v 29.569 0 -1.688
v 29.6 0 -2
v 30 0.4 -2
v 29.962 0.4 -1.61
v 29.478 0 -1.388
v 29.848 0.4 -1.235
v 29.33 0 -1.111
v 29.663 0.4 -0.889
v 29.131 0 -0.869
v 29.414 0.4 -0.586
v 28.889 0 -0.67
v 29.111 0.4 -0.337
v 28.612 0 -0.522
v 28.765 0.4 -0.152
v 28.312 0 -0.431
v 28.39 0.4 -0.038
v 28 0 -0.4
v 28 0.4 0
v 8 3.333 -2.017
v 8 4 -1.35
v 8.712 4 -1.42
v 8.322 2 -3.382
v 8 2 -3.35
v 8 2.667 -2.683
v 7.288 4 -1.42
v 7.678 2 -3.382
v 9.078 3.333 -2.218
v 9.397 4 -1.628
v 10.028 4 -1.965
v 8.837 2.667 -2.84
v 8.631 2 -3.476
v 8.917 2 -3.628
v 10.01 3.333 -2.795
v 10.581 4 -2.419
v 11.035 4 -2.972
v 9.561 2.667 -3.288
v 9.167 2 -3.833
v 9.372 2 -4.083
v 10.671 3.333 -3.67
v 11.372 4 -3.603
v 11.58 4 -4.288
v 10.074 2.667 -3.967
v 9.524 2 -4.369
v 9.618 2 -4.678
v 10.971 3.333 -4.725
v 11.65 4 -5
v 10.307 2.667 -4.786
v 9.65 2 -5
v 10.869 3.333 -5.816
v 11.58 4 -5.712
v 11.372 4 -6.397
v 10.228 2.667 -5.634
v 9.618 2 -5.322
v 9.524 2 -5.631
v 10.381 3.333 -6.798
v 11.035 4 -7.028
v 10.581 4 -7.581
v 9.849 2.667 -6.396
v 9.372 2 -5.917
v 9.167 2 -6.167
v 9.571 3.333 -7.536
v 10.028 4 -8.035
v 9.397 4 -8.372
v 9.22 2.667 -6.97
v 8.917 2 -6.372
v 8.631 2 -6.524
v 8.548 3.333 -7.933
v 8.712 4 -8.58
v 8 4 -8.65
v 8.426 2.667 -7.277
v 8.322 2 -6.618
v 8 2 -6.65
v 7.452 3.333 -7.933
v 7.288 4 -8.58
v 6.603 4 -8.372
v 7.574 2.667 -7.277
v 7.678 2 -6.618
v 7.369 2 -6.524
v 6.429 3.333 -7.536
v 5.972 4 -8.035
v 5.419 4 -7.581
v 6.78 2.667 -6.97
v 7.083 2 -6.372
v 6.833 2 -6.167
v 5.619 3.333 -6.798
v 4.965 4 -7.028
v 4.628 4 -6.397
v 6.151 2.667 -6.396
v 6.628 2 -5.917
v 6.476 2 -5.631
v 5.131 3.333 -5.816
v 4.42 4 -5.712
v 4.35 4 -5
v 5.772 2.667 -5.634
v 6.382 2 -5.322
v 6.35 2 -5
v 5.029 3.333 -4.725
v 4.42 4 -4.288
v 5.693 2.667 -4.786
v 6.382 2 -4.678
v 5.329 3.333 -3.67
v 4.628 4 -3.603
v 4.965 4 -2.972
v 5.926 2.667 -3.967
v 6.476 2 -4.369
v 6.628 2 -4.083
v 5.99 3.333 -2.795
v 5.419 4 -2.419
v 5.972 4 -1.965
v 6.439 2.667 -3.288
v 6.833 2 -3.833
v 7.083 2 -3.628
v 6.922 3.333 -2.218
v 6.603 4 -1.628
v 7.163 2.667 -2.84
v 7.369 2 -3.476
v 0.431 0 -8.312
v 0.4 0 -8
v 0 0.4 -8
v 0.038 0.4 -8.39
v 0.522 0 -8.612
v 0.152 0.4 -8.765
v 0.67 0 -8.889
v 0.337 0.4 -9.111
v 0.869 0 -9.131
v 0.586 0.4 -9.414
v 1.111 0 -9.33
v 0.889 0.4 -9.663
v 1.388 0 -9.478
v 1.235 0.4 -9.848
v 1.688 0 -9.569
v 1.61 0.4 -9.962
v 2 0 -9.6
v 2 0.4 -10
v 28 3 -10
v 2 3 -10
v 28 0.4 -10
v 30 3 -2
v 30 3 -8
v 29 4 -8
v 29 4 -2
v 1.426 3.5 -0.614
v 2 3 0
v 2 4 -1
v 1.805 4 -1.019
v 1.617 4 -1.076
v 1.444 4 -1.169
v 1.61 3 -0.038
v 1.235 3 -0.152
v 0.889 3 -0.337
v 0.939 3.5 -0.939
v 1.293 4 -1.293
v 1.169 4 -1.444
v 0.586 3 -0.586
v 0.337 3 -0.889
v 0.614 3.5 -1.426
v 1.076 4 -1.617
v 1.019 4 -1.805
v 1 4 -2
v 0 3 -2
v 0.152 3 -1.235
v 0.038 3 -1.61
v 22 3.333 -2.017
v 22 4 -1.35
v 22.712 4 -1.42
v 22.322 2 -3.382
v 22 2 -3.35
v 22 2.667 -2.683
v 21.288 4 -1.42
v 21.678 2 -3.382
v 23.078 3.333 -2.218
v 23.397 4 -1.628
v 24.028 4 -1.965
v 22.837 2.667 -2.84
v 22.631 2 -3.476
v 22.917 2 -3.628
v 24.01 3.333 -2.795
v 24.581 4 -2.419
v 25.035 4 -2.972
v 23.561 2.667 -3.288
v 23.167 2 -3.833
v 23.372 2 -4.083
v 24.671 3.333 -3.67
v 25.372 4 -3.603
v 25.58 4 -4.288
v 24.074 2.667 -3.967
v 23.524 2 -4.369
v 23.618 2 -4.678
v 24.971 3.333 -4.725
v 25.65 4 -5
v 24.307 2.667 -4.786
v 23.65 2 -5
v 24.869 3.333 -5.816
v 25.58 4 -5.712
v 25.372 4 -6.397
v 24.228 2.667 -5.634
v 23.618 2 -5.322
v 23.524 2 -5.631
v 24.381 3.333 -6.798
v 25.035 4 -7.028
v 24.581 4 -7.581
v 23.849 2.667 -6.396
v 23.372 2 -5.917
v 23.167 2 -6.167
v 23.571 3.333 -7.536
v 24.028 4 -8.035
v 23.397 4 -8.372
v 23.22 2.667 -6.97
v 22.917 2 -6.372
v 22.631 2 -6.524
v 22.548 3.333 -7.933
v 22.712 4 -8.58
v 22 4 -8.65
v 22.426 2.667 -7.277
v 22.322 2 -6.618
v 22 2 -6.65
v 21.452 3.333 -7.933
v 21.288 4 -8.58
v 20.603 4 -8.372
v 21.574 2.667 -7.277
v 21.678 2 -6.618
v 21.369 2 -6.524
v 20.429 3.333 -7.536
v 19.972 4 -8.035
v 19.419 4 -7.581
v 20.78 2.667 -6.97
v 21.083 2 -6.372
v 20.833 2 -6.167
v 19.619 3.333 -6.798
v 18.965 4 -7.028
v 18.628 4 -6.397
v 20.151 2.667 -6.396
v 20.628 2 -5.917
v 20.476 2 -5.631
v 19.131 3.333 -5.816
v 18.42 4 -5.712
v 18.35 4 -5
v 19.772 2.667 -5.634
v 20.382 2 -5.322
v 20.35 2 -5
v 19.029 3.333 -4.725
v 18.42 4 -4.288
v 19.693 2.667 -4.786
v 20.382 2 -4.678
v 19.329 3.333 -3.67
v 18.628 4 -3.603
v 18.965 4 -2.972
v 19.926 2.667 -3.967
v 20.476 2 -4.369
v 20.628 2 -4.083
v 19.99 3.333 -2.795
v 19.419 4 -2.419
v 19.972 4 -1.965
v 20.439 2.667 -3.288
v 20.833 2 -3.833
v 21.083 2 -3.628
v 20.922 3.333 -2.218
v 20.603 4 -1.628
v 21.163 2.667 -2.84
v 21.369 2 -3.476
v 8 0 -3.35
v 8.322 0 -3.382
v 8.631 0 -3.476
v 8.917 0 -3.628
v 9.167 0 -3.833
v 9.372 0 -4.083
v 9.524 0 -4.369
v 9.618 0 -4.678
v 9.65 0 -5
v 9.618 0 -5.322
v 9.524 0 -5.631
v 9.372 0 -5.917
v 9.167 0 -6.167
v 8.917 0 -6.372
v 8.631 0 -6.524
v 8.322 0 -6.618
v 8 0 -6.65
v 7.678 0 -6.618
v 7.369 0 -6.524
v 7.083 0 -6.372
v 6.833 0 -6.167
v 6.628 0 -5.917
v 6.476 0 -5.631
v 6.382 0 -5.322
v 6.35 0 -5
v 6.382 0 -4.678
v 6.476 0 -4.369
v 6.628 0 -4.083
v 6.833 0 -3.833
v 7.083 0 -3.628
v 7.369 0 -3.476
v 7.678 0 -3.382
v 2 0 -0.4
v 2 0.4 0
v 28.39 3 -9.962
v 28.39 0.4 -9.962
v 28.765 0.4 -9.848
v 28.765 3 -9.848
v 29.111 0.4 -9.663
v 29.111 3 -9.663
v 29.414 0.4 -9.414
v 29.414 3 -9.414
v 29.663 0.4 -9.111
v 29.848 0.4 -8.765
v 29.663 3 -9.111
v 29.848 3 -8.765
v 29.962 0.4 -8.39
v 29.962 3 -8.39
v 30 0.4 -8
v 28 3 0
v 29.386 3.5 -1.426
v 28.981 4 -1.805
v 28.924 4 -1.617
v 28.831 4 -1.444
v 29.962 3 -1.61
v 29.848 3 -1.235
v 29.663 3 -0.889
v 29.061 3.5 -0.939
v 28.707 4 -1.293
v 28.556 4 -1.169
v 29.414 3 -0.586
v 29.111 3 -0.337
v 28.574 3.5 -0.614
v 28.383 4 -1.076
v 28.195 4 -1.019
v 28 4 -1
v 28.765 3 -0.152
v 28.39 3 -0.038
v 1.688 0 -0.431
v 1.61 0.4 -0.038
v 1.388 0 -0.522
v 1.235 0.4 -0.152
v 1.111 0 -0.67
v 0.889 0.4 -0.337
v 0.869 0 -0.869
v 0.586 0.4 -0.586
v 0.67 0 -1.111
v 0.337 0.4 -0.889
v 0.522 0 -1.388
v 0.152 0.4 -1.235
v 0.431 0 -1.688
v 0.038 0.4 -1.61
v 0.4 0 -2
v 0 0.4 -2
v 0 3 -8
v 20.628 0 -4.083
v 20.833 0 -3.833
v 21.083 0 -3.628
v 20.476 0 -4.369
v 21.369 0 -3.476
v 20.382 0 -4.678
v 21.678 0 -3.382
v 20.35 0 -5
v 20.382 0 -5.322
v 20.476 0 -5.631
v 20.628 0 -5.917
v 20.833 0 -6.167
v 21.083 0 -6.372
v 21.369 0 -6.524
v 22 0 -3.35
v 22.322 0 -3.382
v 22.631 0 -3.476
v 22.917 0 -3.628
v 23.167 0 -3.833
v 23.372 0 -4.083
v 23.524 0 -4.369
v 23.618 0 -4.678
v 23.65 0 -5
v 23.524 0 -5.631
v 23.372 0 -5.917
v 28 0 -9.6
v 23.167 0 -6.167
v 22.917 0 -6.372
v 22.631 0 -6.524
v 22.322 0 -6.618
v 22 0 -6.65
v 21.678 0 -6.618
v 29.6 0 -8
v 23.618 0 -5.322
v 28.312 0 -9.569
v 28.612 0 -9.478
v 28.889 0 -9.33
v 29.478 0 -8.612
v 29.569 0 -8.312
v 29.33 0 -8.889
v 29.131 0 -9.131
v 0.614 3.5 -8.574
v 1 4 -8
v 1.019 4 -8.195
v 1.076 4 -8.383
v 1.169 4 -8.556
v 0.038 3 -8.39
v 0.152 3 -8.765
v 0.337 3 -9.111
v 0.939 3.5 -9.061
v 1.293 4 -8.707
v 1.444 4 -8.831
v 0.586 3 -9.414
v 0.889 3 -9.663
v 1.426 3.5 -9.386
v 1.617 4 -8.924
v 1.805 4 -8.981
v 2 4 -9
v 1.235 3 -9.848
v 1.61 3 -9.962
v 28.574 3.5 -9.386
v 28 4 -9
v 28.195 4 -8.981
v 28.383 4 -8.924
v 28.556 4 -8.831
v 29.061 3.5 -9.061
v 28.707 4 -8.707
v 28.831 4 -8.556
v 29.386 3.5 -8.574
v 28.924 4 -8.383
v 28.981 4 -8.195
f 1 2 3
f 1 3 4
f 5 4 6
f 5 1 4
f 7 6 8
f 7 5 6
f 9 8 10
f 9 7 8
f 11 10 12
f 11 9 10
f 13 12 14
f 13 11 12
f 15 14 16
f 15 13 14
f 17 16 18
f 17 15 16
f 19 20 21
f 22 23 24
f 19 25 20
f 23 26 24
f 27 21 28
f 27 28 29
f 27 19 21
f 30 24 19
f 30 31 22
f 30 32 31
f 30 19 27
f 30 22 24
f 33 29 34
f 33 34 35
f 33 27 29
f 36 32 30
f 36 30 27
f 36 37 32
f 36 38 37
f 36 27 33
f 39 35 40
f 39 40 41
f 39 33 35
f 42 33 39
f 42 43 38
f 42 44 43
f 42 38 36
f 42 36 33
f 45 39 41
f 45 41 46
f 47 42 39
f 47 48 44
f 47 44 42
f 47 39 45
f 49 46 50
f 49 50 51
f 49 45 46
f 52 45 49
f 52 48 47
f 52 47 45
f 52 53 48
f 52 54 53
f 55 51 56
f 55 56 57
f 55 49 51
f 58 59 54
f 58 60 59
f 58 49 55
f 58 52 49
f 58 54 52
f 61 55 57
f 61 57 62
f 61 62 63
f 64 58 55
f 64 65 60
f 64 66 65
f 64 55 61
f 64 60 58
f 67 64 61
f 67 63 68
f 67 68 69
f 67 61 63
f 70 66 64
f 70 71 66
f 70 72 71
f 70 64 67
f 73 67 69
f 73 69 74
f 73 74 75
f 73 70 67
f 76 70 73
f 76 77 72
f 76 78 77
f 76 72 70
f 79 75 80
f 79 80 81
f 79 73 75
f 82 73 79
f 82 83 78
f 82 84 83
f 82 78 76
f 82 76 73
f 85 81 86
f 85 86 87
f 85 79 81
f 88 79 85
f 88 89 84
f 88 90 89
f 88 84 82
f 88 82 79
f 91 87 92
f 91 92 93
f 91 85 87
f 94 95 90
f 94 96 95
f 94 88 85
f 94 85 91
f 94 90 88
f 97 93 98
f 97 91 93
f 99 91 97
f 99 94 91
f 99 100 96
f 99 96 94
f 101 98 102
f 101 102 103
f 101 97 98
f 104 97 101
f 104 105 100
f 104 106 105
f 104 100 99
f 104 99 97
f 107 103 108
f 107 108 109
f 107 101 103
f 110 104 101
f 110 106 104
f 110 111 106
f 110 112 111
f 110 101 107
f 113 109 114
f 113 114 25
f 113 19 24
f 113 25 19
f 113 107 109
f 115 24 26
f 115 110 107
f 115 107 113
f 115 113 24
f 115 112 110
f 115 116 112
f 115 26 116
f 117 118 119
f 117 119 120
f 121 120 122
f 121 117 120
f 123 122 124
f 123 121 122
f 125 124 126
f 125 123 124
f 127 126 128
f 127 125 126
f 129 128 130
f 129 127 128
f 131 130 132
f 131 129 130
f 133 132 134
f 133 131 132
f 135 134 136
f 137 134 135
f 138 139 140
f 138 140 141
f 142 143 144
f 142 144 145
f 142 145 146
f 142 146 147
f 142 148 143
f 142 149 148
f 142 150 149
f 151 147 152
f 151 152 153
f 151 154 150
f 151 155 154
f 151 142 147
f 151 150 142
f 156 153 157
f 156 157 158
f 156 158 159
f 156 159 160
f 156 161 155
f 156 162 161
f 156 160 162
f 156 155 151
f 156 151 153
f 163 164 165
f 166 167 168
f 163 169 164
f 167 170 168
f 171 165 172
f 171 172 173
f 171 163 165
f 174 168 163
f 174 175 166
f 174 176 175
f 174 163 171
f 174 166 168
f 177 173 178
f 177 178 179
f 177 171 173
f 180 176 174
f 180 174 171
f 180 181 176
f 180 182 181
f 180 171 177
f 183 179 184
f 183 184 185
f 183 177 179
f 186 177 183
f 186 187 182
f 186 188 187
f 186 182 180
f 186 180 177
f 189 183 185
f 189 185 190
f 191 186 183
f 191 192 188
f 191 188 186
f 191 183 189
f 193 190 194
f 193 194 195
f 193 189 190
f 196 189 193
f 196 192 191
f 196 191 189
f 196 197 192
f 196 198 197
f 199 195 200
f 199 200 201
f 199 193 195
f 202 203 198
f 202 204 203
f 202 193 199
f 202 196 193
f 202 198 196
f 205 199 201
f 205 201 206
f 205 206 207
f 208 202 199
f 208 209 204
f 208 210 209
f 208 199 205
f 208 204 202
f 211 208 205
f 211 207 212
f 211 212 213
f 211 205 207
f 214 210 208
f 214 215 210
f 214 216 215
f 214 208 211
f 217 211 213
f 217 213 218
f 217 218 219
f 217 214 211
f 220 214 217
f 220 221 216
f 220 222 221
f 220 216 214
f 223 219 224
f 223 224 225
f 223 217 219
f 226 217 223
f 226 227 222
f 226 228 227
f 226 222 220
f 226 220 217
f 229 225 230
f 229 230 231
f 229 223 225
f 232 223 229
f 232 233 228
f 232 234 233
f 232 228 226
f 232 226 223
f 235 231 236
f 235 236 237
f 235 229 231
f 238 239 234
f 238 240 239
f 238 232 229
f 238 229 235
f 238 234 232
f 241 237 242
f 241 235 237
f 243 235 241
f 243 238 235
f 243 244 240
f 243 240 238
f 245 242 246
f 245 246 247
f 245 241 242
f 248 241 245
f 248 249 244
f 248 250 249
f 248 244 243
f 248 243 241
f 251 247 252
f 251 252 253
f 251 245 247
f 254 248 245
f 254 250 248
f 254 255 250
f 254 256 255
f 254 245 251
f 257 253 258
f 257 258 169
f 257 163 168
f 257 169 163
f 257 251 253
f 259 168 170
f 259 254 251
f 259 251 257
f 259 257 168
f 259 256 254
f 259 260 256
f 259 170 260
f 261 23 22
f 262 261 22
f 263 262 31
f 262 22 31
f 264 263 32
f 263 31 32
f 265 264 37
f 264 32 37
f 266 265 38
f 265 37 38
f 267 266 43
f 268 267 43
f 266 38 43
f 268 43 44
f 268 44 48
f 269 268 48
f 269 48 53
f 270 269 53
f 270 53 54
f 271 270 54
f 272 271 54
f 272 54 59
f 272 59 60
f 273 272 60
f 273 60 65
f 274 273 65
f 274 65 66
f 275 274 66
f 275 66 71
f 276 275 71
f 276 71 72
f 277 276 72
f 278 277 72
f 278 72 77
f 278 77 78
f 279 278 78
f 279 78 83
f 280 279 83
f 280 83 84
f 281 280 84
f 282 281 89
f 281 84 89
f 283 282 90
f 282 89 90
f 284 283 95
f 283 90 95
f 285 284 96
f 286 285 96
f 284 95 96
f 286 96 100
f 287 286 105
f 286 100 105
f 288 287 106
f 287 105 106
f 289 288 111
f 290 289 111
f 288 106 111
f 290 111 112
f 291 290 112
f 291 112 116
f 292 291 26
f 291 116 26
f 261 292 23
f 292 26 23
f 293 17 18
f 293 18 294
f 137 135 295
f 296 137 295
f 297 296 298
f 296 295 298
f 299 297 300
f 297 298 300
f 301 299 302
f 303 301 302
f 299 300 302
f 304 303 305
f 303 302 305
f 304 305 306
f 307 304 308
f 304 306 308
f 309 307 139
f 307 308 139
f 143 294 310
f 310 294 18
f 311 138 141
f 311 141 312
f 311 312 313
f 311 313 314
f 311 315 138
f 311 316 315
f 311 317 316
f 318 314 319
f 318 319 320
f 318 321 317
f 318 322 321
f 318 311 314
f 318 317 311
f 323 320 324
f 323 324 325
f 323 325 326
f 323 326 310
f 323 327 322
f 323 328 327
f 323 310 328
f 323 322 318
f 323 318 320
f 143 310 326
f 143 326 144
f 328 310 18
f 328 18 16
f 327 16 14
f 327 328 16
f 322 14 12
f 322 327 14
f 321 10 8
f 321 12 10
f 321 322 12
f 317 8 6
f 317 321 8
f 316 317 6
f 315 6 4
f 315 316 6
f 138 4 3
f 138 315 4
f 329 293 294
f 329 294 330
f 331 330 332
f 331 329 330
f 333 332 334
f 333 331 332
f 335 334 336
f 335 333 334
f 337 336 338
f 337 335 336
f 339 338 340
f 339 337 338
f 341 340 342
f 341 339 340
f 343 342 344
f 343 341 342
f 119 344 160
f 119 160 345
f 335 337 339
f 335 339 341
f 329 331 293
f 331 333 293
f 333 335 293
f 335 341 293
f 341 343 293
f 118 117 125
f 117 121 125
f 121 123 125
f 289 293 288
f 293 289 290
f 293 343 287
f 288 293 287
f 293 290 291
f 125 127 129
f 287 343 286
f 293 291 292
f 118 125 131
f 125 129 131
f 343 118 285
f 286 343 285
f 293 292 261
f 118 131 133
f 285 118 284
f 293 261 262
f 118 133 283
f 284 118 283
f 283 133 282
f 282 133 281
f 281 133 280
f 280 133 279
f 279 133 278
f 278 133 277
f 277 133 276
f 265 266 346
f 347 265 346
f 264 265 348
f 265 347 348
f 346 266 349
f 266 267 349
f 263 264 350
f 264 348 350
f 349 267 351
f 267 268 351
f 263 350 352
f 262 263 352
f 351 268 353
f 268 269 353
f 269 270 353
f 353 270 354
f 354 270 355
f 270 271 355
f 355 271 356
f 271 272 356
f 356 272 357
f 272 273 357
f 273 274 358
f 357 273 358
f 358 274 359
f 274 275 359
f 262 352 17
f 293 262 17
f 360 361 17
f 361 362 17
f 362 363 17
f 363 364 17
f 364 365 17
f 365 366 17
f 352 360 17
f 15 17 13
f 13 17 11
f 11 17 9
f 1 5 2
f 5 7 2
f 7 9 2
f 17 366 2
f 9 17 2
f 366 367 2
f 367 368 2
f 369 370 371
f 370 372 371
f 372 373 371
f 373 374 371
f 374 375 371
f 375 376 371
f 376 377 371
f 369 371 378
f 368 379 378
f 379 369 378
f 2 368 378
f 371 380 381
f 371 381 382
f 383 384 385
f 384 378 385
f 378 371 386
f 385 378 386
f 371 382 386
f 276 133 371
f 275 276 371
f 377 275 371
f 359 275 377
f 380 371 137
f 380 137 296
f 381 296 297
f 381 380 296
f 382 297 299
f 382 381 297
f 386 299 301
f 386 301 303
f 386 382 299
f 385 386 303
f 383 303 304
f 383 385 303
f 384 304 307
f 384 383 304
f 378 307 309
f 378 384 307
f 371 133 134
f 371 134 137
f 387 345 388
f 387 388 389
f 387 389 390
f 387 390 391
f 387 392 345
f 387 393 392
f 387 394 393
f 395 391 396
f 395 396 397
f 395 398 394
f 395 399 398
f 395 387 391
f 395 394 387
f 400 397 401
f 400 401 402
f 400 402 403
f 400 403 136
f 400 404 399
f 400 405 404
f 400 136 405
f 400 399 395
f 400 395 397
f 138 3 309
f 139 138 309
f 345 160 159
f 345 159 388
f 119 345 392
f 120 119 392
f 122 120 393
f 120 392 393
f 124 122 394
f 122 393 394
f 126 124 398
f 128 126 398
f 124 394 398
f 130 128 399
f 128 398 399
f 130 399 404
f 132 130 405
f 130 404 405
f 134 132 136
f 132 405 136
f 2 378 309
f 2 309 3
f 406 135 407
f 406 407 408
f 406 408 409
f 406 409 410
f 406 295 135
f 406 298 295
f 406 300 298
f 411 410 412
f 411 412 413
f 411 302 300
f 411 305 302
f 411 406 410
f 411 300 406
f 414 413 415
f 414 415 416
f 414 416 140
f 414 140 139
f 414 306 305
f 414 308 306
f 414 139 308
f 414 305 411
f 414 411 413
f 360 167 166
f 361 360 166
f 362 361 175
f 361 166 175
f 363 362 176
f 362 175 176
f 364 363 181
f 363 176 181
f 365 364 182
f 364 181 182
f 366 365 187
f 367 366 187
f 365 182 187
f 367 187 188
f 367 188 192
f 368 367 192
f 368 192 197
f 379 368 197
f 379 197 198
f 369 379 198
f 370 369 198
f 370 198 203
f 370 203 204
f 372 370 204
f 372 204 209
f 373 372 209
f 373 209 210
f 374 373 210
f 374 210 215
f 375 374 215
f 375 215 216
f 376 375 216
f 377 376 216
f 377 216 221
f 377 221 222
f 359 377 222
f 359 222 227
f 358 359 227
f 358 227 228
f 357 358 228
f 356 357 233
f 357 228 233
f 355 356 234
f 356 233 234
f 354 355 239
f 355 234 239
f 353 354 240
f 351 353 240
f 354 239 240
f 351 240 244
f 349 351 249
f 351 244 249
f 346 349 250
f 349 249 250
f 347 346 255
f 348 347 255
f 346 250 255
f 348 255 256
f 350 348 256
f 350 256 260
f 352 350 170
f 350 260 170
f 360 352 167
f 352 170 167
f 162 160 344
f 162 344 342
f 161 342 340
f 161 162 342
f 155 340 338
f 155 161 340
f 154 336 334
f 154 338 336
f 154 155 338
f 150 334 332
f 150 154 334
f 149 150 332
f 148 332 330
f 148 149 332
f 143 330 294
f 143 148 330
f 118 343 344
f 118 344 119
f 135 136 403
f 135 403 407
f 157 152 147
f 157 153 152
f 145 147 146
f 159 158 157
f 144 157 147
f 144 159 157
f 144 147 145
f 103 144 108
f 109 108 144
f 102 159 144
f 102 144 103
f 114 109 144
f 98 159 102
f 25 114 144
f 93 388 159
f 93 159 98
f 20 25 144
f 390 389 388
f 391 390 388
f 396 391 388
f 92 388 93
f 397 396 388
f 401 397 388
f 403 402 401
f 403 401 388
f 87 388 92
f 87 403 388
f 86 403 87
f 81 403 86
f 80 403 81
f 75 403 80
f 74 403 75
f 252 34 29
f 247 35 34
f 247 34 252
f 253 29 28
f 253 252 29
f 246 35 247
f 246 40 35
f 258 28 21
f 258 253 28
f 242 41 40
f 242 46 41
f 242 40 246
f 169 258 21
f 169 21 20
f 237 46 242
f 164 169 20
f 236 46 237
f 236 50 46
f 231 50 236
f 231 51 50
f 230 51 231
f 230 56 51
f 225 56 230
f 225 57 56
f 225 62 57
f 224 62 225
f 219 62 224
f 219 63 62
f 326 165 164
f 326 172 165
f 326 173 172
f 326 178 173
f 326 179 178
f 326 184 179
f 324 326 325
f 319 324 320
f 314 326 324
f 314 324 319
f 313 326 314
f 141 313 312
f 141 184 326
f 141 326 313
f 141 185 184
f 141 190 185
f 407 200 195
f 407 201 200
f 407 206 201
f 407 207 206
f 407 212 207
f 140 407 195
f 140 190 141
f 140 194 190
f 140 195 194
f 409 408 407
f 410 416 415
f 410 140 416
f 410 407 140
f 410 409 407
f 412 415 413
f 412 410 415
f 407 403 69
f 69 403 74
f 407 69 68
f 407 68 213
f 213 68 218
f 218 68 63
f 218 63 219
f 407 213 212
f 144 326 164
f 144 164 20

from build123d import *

# Parameters (mm, degrees)
SKETCH_1_W          = 30
SKETCH_1_H          = 10
EXTRUDE_1_DEPTH     = 4
SKETCH_2_R          = 1.65
CUT_EXTRUDE_1_DEPTH = 32.874754901
CHAMFER_1_SIZE      = 2
FILLET_1_R          = 2
CHAMFER_2_SIZE      = 0.4
CHAMFER_3_SIZE      = 1


with BuildPart() as part:
    # 草图1 → 凸台-拉伸1 (new body)
    with BuildSketch(Plane(origin=(0, 0, 0), x_dir=(1, 0, 0), z_dir=(0, 1, 0))):
        with Locations((15, 5)):
            Rectangle(SKETCH_1_W, SKETCH_1_H)
    extrude(amount=EXTRUDE_1_DEPTH)

    # 草图2 → 切除-拉伸1 (cut, through all)
    with BuildSketch(Plane(origin=(0, 4, 0), x_dir=(1, 0, 0), z_dir=(0, 1, 0))):
        with Locations(Location((8, 5, 0), (0, 0, 270))):
            Circle(SKETCH_2_R)
        with Locations(Location((22, 5, 0), (0, 0, 270))):
            Circle(SKETCH_2_R)
    extrude(amount=-CUT_EXTRUDE_1_DEPTH, mode=Mode.SUBTRACT)

    # 倒角1
    chamfer_1_edges = [part.edges().sort_by_distance(p)[0] for p in [
        (8, 4, -6.65),
        (22, 4, -6.65),
    ]]
    chamfer(chamfer_1_edges, length=CHAMFER_1_SIZE)

    # 圆角1
    fillet_1_edges = [part.edges().sort_by_distance(p)[0] for p in [
        (0, 2, -10),
        (30, 2, -10),
        (30, 2, 0),
        (0, 2, 0),
    ]]
    fillet(fillet_1_edges, radius=FILLET_1_R)

    # 倒角2
    chamfer_2_edges = [part.edges().sort_by_distance(p)[0] for p in [
        (15, 0, -10),
        (0, 0, -5),
        (30, 0, -5),
        (15, 0, 0),
        (0.585786438, 0, -9.414213562),
        (0.585786438, 0, -0.585786438),
        (29.414213562, 0, -0.585786438),
        (29.414213562, 0, -9.414213562),
    ]]
    chamfer(chamfer_2_edges, length=CHAMFER_2_SIZE)

    # 倒角3
    chamfer_3_edges = [part.edges().sort_by_distance(p)[0] for p in [
        (15, 4, -10),
        (30, 4, -5),
        (0, 4, -5),
        (15, 4, 0),
        (0.585786438, 4, -9.414213562),
        (0.585786438, 4, -0.585786438),
        (29.414213562, 4, -0.585786438),
        (29.414213562, 4, -9.414213562),
    ]]
    chamfer(chamfer_3_edges, length=CHAMFER_3_SIZE)


solid = part.part
